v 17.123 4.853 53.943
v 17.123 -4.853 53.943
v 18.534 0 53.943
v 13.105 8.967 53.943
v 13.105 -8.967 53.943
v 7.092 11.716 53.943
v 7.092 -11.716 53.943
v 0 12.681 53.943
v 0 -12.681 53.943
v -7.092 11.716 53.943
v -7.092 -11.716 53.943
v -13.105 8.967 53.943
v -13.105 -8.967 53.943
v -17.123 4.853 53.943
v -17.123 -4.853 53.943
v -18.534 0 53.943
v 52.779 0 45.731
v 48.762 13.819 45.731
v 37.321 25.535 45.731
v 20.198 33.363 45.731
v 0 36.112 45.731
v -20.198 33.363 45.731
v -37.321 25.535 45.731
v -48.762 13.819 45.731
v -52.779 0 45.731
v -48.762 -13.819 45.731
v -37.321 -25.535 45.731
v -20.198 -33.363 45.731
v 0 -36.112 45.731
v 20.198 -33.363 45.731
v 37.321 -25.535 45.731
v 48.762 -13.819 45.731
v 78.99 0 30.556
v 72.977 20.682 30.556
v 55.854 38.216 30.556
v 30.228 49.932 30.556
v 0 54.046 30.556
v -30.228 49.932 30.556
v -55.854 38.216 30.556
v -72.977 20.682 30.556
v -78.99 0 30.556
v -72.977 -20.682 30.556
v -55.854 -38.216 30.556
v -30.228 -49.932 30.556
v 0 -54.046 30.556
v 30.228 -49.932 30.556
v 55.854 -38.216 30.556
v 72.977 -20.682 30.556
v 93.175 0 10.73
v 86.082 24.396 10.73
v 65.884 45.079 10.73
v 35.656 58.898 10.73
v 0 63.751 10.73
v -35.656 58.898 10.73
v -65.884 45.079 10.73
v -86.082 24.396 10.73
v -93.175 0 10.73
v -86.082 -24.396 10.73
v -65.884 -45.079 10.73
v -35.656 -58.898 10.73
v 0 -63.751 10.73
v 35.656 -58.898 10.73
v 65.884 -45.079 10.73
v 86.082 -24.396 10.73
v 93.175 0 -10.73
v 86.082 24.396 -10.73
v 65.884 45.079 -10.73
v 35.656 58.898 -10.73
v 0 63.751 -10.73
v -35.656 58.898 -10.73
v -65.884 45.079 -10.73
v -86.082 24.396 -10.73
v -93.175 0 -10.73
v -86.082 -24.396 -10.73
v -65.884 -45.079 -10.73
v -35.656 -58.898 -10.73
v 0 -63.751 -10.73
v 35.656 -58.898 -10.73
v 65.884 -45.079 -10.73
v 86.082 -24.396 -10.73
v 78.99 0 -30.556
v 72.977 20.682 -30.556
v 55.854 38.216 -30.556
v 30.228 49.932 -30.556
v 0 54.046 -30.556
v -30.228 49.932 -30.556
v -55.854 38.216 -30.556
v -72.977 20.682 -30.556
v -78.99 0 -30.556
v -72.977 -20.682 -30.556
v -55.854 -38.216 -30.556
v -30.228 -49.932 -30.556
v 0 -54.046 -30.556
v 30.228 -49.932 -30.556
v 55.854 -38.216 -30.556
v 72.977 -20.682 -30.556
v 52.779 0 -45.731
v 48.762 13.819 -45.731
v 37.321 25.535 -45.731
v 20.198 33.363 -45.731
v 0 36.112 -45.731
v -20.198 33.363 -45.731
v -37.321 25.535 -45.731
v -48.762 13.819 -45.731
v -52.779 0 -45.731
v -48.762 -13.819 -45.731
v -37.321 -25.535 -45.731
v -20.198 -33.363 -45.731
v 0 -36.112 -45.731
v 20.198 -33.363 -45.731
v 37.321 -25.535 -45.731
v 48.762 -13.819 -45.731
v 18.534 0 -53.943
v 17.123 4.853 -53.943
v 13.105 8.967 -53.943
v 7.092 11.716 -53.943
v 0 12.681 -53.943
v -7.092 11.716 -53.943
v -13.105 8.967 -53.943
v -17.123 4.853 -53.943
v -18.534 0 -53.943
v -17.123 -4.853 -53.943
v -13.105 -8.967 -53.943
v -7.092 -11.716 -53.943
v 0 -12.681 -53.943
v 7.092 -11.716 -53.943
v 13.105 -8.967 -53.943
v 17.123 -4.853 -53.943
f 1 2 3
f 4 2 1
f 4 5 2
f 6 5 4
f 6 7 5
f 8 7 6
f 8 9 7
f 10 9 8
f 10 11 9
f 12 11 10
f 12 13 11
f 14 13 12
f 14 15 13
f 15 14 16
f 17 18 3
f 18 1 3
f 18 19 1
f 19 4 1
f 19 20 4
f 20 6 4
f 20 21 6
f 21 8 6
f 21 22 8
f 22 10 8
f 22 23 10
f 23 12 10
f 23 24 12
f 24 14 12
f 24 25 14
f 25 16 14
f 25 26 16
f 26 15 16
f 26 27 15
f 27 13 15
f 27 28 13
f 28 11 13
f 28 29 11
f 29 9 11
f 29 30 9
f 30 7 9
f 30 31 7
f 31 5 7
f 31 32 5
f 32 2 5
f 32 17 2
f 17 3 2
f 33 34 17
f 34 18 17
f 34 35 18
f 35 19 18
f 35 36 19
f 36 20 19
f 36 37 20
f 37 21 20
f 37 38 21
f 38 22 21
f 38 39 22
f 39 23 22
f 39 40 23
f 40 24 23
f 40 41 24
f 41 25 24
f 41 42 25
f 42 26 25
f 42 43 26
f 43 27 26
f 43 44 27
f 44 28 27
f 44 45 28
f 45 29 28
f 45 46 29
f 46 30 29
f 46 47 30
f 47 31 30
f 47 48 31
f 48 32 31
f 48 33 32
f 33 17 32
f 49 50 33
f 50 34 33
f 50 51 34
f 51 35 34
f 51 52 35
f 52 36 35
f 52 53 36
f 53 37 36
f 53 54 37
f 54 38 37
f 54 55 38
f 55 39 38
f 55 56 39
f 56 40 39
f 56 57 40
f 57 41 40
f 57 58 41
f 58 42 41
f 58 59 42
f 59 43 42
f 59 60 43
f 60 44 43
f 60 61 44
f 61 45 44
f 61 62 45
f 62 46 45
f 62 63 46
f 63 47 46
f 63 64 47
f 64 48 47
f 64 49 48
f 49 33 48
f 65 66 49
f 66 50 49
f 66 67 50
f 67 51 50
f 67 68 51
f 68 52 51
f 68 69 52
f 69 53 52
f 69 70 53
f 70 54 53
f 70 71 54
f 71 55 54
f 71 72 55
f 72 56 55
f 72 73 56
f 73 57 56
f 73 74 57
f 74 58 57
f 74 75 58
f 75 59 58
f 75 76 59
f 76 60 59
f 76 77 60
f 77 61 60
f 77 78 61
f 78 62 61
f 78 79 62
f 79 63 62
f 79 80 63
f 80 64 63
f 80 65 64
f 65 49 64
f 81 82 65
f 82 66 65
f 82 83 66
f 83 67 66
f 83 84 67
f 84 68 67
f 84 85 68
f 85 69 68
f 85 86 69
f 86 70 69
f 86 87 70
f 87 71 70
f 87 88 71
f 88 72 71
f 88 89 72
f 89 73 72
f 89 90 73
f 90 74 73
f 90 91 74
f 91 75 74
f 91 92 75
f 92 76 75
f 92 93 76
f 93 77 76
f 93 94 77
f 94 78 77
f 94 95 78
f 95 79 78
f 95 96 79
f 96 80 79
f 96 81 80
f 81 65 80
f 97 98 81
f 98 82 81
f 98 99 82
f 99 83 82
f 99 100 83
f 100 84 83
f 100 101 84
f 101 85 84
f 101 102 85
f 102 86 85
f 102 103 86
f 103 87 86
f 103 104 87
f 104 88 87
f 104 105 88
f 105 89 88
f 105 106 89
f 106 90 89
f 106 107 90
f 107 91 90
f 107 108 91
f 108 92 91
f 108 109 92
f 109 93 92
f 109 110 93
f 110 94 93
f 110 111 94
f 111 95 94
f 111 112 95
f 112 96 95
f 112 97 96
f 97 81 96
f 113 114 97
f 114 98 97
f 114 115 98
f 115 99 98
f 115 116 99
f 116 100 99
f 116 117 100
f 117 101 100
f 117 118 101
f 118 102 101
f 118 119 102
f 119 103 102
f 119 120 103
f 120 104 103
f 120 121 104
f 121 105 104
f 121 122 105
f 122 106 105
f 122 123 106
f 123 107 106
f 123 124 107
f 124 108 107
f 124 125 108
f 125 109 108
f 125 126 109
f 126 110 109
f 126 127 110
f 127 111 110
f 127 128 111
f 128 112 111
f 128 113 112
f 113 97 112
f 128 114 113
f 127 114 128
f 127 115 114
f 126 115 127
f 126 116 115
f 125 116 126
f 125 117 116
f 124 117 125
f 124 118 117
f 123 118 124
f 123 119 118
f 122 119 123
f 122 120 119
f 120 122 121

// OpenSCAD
// Generated by SolidPython 1.0.1 on 2020-07-29 00:46:54


scale(v = [19, 13, 11]) {
	sphere(r = 5);
}
/***********************************************
*********      SolidPython code:      **********
************************************************
 
# import packages: SolidPython
from solid import *
from solid.utils import *
from itertools import chain, combinations, permutations


class Resize:

    def __init__(self, scad_file):
        self.scad_file = scad_file
        #self.scad_file = import_scad(scad_file)
        # cone/cylinder param:
        self.r1 = 0
        self.r2 = 0
        self.h = 0
        # rectangular prism param:
        self.w = 0
        self.l = 0
        # ellipse param:
        self.r = 0

    # import OpenScad code (file name corresponds to shape)


    # classify shape + parameters
    def assign(self, param1, param2, param3):
        if self.scad_file == 'cone.scad':
            self.r1 = param1
            self.r2 = param2
            self.h = param3
        elif self.scad_file == 'cylinder.scad':
            self.r1 = param1
            self.r2 = param2
            self.h = param3
        elif self.scad_file == 'rectangularPrism.scad':
            self.h = param1
            self.l = param2
            self.w = param3
        else:
            self.r = param1
            self.h = param2

    # resize parameters
    def iterate(self):
        x = range(3, 20, 2)
        i = 1
        if self.scad_file == 'cone.scad':
            tempList = list(permutations(x, 2))
            for temp in tempList:
                param1 = temp[0]
                param2 = temp[1]
                filepath = 'produced_scad_files/' + 'cone' + str(param1) + '_' + str(param2) + '_' + '.scad'
                scad_render_to_file(cylinder(h=param1, r1=param2, r2=0), filepath)

        elif self.scad_file == 'cylinder.scad':
            tempList = list(permutations(x, 3))
            for temp in tempList:
                param1 = temp[0]
                param2 = temp[1]
                filepath = 'produced_scad_files/' + 'cylinder' + str(param1) + '_' + str(param2) + '_' + '.scad'
                scad_render_to_file(cylinder(h=param1, r1=param2, r2=param2), filepath)

        elif self.scad_file == 'rectangularPrism.scad':
            tempList = list(permutations(x, 3))
            for temp in tempList:
                param1 = temp[0]
                param2 = temp[1]
                param3 = temp[2]
                filepath = 'produced_scad_files/' + 'rectangularPrism' + str(param1) + '_' + str(param2) + '_' + str(
                    param3) + '.scad'
                scad_render_to_file(cube(size=(param1, param2, param3)), filepath)

        elif self.scad_file == 'ellipse.scad':
            tempList = list(permutations(x, 4))
            for temp in tempList:
                param1 = temp[0]
                param2 = temp[1]
                param3 = temp[2]
                param4 = temp[3]
                filepath = 'produced_scad_files/' + 'ellipse' + str(param1) + '_' + str(param2) + '_' + str(param3) + '_' + str(param4) + '.scad'
                scad_render_to_file(scale([param1, param2, param3])(sphere(r=param4)), filepath)

    def render_to_scadfile(self):
        scad_render_to_file(scad, 'example.scad') 
 
************************************************/
